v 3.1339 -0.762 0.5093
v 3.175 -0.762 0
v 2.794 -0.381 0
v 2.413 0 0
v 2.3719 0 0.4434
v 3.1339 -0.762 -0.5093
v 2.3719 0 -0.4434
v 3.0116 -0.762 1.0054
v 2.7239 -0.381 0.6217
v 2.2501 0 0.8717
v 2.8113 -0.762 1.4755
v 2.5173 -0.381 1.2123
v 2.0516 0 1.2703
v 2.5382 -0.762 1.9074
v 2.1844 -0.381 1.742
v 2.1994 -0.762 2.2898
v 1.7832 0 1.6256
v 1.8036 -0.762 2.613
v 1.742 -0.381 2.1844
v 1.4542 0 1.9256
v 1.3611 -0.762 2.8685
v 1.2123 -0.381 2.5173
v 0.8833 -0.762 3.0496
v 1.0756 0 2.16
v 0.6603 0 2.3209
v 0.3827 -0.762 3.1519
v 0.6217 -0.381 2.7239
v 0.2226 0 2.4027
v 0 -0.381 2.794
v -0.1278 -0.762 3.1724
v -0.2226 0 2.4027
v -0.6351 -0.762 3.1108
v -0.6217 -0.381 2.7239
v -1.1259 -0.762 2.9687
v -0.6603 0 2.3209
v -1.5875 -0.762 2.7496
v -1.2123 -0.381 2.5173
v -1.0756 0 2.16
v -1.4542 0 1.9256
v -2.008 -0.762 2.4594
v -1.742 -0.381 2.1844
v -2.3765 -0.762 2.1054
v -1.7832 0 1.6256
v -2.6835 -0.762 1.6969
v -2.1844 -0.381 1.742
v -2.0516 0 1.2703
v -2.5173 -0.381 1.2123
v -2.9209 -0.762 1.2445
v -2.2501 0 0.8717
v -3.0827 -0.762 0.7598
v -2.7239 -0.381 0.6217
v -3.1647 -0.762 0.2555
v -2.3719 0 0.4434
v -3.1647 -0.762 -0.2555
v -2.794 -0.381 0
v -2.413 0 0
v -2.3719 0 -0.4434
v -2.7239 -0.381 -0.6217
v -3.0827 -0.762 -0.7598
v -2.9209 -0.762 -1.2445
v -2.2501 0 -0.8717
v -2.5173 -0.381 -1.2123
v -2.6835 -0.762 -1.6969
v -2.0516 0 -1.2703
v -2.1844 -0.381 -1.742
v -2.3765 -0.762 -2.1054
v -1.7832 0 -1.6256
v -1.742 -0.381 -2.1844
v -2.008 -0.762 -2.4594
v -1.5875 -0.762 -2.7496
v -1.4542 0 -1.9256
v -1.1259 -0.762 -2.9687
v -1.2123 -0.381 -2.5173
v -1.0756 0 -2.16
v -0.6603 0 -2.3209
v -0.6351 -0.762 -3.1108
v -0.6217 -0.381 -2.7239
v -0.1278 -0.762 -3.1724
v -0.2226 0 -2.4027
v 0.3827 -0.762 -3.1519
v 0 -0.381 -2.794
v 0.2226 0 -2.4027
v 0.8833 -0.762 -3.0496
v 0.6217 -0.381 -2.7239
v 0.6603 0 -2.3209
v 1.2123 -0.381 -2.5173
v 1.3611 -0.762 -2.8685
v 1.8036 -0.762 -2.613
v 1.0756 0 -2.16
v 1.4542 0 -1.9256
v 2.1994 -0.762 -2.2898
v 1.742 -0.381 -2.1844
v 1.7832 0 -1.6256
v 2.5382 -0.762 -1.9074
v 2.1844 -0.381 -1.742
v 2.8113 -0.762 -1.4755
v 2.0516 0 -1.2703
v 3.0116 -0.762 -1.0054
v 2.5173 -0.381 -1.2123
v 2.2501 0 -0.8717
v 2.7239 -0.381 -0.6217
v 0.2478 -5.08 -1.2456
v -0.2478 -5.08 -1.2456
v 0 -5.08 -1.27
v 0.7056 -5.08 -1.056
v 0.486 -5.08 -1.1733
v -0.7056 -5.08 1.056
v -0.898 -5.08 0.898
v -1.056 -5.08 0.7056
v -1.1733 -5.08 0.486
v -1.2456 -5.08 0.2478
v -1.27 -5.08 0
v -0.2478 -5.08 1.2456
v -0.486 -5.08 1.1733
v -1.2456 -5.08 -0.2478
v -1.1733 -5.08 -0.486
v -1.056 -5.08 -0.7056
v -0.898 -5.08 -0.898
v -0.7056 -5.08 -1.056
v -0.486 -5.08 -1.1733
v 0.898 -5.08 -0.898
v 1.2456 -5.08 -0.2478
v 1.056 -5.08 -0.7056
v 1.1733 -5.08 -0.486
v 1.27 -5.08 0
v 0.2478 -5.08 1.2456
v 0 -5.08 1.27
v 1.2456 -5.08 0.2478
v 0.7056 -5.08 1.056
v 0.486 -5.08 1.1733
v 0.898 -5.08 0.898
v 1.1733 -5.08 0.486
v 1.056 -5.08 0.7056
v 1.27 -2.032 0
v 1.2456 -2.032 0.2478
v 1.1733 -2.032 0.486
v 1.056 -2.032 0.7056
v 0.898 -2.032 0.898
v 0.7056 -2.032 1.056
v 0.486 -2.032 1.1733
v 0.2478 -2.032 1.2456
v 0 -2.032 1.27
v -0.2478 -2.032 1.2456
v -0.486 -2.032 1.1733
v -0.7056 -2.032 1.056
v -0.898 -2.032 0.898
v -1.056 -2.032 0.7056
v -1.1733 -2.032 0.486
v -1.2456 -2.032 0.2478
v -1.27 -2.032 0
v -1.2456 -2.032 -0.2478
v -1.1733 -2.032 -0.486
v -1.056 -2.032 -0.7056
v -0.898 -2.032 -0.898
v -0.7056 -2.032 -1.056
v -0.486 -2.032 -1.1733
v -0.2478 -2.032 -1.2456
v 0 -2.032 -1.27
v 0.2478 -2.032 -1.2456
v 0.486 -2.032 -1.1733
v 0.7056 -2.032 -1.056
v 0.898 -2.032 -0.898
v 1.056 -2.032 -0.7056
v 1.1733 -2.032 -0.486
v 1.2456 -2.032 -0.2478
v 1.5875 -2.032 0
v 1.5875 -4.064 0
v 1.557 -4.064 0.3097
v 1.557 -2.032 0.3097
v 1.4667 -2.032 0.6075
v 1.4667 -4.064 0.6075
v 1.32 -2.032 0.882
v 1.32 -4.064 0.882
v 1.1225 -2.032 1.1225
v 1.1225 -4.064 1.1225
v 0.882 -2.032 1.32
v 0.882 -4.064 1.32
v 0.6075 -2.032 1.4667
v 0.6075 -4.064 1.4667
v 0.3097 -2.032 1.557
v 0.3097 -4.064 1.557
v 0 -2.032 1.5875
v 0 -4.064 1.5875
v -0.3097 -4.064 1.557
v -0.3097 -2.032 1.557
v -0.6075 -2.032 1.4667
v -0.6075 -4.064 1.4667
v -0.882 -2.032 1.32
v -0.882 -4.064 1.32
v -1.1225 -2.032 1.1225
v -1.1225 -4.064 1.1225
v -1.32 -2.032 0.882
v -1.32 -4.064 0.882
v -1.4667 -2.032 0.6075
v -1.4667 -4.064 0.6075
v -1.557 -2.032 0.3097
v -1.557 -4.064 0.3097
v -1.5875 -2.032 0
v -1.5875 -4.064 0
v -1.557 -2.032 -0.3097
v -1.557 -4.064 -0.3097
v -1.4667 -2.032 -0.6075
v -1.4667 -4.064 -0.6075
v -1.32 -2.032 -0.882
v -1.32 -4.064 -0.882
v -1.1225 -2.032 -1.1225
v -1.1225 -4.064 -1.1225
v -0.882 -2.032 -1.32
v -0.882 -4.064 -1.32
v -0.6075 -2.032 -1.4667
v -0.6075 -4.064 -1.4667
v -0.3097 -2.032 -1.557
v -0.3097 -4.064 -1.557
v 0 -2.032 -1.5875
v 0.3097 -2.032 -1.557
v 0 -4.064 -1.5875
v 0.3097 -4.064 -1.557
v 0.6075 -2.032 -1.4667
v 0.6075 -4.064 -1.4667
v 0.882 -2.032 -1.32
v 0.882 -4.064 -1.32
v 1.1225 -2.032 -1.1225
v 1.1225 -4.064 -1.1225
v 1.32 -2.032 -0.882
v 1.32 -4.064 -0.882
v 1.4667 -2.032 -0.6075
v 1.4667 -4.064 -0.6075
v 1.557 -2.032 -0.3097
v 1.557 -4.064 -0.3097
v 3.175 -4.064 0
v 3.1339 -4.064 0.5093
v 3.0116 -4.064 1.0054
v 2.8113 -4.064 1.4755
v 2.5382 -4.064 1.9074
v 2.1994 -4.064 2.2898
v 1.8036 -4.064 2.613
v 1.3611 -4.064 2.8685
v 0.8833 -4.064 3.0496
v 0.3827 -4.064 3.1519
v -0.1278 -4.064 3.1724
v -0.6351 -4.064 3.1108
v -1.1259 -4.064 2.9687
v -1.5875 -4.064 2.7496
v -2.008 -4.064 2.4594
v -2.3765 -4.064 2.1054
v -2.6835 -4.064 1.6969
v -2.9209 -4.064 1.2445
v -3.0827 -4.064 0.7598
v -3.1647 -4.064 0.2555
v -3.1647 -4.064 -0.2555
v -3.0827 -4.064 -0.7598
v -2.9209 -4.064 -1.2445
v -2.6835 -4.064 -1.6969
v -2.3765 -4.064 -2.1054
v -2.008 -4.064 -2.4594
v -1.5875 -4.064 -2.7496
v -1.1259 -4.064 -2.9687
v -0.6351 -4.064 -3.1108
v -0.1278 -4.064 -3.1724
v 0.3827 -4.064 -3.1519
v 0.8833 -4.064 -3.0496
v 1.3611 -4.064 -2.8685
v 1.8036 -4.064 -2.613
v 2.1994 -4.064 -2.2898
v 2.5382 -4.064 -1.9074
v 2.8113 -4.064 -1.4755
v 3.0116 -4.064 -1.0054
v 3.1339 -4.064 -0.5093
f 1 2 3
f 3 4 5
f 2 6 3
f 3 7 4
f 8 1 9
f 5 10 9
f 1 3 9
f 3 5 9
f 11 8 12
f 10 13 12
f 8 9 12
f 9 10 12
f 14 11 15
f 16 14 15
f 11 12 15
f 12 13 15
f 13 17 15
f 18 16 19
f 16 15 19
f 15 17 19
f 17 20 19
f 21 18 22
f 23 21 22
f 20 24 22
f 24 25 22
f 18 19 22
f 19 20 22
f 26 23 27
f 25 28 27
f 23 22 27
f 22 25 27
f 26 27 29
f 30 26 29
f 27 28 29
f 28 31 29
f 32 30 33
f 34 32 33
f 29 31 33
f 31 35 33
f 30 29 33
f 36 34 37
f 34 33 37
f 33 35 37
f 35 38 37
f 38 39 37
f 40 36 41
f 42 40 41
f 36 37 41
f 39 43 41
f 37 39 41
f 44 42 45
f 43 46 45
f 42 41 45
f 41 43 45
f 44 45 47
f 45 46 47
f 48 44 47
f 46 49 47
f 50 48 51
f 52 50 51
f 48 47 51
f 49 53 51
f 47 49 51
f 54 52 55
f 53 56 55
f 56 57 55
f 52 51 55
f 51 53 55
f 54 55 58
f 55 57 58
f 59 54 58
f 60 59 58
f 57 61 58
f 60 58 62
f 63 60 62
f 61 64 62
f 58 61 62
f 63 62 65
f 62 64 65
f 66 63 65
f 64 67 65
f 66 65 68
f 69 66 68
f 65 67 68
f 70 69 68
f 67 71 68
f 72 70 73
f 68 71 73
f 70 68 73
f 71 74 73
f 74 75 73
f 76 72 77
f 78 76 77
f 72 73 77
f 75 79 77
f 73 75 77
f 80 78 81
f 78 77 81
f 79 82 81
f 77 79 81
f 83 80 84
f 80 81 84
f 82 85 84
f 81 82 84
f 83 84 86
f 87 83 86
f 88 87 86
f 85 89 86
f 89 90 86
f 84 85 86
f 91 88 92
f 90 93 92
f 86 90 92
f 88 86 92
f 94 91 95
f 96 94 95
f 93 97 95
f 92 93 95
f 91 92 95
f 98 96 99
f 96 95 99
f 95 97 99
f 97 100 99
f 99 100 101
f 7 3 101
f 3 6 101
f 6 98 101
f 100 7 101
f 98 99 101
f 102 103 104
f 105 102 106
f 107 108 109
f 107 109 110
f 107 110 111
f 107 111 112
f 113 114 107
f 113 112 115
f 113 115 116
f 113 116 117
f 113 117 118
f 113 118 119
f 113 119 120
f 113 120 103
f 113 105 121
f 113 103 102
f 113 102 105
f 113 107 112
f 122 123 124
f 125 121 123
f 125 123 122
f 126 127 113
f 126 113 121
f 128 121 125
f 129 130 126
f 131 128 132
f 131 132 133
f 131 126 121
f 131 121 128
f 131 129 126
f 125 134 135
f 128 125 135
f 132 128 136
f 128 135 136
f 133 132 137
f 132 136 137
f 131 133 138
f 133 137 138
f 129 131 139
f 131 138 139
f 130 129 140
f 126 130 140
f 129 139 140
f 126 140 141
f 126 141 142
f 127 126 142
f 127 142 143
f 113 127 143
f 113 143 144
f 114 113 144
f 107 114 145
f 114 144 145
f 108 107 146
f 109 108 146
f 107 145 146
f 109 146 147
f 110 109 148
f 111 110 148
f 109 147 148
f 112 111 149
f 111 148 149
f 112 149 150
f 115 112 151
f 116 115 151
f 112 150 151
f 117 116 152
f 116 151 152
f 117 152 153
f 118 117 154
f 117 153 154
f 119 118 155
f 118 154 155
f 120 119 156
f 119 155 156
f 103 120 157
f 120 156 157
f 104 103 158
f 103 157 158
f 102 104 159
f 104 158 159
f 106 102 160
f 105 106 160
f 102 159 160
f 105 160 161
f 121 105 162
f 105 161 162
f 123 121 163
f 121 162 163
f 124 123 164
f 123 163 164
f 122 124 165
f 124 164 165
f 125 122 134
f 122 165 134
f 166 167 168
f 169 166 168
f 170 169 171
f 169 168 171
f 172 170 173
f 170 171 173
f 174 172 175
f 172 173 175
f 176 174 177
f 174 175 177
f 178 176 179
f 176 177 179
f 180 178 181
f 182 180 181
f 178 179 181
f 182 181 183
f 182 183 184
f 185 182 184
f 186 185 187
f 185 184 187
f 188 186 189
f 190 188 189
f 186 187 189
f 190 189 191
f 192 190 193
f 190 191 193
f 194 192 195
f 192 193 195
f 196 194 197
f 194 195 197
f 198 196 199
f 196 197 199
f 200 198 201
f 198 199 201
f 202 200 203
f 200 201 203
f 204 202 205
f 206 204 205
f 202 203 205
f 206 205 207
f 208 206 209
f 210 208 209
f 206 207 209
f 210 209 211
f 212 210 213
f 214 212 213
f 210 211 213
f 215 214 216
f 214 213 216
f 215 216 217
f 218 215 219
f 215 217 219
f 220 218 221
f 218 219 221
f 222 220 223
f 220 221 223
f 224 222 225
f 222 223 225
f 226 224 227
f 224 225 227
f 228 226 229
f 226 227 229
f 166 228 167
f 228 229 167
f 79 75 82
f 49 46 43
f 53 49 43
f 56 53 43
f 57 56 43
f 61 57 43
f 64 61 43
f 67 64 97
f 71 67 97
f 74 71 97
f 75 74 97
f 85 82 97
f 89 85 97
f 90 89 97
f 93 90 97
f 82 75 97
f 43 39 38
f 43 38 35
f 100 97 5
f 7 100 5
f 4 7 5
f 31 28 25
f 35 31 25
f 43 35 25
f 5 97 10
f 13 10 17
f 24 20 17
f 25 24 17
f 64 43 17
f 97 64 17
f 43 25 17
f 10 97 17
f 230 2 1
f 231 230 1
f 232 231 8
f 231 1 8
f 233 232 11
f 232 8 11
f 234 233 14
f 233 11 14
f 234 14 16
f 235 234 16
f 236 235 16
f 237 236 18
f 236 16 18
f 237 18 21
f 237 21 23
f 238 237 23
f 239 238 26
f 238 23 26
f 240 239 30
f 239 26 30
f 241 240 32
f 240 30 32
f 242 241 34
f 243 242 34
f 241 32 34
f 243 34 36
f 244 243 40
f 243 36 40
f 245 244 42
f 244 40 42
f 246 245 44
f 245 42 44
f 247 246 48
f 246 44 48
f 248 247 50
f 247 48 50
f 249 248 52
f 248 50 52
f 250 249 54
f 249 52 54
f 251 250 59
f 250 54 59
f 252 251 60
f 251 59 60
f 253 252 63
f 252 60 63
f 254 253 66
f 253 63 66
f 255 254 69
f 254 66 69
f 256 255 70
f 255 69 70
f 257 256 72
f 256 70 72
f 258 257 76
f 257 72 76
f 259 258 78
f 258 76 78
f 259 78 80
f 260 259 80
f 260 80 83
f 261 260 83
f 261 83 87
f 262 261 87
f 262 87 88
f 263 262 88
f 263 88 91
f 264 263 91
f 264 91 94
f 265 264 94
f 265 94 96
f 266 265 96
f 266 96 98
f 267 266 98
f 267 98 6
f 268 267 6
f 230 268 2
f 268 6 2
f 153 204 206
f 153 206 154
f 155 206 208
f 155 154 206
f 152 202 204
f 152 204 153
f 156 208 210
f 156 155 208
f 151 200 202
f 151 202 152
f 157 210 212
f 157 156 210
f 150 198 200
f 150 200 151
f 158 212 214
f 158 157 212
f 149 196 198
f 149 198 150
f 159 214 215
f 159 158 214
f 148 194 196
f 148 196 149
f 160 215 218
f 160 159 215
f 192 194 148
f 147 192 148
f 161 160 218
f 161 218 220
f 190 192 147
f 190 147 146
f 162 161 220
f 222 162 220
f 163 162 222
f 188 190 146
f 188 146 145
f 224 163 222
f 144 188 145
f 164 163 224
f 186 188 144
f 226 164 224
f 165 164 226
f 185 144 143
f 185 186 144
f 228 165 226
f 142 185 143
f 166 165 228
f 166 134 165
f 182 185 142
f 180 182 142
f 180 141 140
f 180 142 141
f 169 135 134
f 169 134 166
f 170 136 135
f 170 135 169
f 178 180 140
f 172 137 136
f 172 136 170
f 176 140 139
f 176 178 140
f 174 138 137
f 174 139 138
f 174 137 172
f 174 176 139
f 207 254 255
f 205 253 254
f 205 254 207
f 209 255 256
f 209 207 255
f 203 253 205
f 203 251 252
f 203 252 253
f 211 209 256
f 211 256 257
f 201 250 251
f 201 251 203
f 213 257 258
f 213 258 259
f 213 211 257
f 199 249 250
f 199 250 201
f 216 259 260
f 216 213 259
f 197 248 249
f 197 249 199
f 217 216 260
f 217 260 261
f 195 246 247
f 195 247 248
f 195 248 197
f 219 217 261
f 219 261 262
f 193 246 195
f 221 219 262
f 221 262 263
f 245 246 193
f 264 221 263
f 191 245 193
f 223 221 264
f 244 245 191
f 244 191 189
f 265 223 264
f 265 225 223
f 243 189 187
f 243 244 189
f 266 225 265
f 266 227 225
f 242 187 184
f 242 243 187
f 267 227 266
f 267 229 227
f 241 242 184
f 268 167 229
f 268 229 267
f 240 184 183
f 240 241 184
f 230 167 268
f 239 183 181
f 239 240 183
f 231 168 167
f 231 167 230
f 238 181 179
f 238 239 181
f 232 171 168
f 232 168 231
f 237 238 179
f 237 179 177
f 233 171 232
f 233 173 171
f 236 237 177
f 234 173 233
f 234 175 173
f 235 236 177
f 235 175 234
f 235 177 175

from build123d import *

# Parameters (mm, degrees)
F0_R     = 3.175
F1_DEPTH = 4.064
F2_R     = 1.5875
F3_DEPTH = 2.032
F4_R     = 1.27
F5_DEPTH = 3.048
F6_SIZE  = 0.762


with BuildPart() as f1:
    # F0 (on Front) → F1 (new body)
    with BuildSketch(Plane.XZ):
        Circle(F0_R)
    extrude(amount=F1_DEPTH)

    # F2 (on face) → F3 (cut)
    with BuildSketch(Plane.XZ.offset(4.064)):
        Circle(F2_R)
    extrude(amount=-F3_DEPTH, mode=Mode.SUBTRACT)

    # F4 (on face) → F5 (join)
    with BuildSketch(Plane.XZ.offset(2.032)):
        Circle(F4_R)
    extrude(amount=F5_DEPTH)

    # F6
    f6_edges = [f1.edges().sort_by_distance(p)[0] for p in [
        (-3.175, 0, 0),
    ]]
    chamfer(f6_edges, length=F6_SIZE)


solid = f1.part
